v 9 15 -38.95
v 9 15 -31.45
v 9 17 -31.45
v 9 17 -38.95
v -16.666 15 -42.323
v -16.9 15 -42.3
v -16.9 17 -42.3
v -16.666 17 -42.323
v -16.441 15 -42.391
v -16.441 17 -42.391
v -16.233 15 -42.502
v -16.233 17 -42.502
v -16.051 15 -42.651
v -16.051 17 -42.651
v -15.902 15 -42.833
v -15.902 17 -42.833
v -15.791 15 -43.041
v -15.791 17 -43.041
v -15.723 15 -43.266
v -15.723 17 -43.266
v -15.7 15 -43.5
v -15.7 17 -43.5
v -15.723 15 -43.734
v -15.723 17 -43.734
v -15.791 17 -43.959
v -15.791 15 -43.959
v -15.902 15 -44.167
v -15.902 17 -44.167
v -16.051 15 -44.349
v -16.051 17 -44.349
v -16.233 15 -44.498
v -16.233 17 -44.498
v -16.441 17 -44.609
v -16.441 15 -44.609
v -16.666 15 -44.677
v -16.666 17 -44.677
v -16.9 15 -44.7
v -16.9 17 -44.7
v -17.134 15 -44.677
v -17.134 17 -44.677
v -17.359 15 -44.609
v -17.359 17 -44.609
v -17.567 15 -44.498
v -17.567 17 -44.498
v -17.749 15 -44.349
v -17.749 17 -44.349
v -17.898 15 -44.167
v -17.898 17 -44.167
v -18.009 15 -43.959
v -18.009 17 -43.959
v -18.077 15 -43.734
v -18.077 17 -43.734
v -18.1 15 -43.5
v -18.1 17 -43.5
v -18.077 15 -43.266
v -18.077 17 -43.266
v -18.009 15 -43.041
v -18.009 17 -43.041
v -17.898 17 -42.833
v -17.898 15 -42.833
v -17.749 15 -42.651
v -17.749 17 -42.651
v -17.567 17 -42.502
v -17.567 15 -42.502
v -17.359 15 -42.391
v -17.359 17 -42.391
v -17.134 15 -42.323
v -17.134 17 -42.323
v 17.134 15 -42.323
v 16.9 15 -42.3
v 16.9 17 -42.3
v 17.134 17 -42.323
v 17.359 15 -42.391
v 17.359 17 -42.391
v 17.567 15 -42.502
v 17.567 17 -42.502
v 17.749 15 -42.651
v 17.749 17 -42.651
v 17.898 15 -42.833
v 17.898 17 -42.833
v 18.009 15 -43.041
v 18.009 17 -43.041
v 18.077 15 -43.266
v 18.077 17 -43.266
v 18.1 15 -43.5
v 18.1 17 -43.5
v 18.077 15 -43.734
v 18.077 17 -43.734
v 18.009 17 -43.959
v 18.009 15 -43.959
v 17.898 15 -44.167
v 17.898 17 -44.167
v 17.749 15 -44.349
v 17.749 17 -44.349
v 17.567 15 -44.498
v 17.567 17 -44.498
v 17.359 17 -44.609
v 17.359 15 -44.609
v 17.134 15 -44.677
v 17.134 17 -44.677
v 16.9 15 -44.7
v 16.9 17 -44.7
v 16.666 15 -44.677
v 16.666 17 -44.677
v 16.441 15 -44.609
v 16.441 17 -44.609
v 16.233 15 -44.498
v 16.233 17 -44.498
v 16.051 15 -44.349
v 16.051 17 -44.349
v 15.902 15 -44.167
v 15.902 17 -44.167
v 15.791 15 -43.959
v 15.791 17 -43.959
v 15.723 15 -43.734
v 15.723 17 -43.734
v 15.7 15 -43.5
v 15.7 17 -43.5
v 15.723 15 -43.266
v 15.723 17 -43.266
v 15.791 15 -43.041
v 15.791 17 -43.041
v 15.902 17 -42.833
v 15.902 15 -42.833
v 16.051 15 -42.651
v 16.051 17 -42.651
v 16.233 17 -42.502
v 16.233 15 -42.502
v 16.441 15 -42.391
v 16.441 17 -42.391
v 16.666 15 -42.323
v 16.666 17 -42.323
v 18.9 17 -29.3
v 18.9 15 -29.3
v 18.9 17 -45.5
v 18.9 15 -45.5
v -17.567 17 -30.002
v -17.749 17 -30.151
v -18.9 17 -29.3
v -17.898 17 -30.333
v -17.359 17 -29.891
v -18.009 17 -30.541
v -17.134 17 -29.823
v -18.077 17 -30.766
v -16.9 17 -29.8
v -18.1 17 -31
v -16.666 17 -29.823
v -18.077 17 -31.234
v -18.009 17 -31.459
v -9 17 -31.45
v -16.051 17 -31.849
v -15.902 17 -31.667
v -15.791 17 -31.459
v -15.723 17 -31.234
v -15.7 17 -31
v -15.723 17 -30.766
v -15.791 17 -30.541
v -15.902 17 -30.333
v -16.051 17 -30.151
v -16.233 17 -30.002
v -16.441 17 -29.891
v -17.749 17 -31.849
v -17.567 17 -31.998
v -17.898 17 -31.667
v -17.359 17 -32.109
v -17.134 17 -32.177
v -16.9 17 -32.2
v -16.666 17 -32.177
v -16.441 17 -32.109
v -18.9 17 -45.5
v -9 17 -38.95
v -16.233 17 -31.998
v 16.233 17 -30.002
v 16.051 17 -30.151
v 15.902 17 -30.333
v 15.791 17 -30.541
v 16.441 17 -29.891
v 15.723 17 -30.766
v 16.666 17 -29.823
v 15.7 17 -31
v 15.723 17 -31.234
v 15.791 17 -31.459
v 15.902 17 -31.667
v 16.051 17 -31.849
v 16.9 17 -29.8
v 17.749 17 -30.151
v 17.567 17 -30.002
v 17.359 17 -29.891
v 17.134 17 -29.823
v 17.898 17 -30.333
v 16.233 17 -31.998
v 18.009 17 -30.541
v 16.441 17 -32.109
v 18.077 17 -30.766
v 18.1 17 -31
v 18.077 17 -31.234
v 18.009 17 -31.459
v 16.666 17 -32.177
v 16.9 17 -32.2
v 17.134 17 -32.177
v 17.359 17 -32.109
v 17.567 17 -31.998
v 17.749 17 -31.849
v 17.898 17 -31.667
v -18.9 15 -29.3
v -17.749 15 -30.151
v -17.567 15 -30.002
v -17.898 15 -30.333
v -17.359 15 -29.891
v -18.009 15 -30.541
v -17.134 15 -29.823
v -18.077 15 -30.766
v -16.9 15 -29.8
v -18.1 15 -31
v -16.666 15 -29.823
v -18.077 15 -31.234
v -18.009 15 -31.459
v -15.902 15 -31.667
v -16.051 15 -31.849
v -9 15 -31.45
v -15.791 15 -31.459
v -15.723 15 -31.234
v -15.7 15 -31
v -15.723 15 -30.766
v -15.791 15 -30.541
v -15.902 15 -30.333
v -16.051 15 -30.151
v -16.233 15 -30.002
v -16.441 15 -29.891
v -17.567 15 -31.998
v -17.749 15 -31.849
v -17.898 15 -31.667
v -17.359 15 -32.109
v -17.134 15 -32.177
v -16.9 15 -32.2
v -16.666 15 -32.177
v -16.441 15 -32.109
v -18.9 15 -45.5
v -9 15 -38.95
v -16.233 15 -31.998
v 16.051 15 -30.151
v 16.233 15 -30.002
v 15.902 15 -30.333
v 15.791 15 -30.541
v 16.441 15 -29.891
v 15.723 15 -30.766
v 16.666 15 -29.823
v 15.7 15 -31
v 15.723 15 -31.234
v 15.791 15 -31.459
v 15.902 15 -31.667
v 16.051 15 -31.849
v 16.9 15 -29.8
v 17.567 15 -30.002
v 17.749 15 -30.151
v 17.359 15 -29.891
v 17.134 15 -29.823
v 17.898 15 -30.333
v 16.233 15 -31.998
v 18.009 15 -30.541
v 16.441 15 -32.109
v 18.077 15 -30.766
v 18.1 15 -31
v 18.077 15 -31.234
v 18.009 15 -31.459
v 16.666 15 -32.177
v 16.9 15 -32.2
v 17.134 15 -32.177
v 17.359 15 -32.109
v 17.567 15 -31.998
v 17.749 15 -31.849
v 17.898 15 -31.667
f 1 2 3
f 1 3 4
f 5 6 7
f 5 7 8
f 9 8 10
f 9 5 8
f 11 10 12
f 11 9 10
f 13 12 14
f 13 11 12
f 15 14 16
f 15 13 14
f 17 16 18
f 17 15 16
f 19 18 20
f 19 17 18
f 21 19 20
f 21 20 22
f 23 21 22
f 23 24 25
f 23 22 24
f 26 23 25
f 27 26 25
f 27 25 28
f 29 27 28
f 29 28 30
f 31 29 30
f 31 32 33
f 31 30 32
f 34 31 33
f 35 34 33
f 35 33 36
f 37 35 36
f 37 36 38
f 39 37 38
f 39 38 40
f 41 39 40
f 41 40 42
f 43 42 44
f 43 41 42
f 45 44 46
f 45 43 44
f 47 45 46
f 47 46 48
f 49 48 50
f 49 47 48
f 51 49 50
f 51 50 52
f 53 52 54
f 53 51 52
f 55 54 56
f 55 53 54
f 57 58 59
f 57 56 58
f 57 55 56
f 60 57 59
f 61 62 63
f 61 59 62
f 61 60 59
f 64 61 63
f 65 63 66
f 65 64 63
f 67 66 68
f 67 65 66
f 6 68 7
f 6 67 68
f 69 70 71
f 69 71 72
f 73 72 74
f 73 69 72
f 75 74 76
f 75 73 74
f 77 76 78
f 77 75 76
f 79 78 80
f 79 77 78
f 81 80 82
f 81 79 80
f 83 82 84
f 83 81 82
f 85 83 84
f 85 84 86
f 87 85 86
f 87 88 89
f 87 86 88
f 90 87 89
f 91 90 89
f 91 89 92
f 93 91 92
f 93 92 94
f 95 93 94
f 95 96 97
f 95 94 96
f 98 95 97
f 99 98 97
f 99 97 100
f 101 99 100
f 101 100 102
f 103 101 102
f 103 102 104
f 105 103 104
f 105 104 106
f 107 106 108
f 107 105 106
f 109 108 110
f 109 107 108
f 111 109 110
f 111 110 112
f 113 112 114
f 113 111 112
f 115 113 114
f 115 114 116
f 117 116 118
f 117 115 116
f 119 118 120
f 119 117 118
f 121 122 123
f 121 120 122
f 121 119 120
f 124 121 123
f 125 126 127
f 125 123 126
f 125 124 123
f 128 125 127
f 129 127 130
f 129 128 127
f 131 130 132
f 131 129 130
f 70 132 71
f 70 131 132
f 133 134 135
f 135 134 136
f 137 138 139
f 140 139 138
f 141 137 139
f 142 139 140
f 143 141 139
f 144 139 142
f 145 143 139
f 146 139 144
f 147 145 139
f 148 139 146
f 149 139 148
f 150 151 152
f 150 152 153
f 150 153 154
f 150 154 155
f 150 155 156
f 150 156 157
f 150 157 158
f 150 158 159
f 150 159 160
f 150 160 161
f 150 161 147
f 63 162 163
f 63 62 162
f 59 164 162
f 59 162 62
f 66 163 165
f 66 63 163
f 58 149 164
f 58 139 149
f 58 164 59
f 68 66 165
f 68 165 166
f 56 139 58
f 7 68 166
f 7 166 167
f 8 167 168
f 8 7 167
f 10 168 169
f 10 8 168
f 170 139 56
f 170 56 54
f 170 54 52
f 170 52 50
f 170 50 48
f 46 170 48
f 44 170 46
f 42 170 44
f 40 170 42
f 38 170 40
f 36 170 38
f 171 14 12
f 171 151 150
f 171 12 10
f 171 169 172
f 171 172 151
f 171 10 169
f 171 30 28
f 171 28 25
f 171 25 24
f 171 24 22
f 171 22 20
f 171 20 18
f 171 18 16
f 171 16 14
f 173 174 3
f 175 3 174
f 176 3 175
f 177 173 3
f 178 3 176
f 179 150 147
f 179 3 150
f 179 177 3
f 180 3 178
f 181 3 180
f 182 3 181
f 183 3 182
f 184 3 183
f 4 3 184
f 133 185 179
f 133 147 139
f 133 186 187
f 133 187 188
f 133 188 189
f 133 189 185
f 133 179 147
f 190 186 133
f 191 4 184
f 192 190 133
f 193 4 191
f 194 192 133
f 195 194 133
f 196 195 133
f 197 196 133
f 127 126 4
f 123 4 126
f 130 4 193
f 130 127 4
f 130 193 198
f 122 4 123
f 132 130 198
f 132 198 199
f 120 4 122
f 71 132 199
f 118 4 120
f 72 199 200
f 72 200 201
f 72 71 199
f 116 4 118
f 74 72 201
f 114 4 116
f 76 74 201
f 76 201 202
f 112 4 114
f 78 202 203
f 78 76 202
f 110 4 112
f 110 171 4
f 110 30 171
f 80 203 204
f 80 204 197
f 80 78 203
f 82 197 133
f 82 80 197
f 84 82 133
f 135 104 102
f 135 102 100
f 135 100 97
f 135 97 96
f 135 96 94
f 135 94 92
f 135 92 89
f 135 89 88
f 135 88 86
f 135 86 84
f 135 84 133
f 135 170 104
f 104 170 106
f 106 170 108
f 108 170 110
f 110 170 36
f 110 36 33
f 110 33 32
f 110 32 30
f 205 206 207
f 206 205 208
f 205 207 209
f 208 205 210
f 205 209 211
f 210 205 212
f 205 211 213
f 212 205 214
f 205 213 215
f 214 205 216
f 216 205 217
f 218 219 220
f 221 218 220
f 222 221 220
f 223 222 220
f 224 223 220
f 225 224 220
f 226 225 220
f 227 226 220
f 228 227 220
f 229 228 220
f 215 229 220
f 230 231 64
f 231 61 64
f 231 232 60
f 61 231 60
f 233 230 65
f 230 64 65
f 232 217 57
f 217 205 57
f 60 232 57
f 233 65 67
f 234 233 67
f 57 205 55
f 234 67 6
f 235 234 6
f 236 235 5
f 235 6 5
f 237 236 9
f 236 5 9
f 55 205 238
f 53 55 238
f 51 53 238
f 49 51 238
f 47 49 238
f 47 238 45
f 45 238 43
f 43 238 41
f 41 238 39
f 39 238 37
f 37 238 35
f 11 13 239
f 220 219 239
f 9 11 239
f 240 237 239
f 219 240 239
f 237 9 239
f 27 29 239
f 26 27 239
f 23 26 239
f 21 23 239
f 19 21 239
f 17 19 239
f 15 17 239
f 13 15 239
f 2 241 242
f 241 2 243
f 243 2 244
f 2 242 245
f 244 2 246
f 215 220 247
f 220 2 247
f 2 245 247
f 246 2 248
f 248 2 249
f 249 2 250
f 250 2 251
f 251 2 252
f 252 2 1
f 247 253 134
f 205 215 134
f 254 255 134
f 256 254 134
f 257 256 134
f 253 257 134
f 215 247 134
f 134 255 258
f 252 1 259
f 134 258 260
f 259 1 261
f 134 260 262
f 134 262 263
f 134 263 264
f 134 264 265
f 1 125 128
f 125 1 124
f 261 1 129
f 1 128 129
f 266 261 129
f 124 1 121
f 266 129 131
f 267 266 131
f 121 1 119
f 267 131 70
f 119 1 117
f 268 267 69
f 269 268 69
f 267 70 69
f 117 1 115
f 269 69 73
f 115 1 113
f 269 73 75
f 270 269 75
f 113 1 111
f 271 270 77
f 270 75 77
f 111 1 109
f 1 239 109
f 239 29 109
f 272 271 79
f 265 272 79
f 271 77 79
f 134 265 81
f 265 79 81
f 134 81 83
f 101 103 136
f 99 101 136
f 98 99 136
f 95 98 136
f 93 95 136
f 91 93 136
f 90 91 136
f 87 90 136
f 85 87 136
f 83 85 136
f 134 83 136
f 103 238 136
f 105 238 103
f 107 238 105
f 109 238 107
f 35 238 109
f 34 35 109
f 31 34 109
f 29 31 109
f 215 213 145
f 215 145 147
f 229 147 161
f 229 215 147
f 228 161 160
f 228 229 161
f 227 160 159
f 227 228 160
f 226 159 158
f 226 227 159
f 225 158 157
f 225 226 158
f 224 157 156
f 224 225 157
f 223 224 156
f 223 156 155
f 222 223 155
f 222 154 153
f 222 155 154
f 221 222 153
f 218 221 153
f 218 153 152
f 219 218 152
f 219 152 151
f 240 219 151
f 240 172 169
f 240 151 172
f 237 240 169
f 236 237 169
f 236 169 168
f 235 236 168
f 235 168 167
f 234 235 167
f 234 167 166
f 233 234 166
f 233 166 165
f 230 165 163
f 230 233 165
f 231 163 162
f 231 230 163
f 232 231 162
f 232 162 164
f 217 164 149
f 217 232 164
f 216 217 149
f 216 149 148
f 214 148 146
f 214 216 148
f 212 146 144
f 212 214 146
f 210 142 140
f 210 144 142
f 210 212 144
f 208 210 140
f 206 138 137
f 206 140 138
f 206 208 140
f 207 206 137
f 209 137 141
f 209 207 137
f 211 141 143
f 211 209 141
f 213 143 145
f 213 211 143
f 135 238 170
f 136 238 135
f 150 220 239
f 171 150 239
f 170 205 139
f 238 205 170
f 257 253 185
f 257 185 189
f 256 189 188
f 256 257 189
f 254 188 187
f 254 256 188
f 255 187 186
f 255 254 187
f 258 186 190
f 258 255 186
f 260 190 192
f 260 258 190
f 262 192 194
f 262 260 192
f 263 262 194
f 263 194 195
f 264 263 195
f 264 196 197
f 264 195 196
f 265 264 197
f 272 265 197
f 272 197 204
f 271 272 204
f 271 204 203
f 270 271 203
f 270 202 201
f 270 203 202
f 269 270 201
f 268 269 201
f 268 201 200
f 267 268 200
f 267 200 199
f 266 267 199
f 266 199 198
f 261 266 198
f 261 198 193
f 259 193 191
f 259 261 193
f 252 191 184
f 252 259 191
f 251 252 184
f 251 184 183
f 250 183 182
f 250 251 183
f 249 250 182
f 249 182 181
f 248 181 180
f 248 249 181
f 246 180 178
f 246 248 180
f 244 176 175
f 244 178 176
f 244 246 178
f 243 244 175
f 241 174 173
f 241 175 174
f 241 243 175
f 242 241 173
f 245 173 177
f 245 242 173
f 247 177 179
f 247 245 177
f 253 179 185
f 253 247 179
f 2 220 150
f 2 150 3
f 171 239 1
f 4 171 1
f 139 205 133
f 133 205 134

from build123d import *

# Parameters (mm, degrees)
SKETCH1_W                = 37.8
SKETCH1_H                = 16.2
RETAINER_PLATE_DEPTH     = 2
SKETCH2_W                = 18
SKETCH2_H                = 7.5
RIBBON_SLOT_DEPTH        = 4
SKETCH3_R                = 1.2
M2_CLEARANCE_HOLES_DEPTH = 4


with BuildPart() as part:
    # Sketch1 → Retainer Plate (new body)
    with BuildSketch(Plane(origin=(0, 15, 0), x_dir=(1, 0, 0), z_dir=(0, 1, 0))):
        with Locations((0, 37.4)):
            Rectangle(SKETCH1_W, SKETCH1_H)
    extrude(amount=RETAINER_PLATE_DEPTH)

    # Sketch2 → Ribbon Slot (cut)
    with BuildSketch(Plane(origin=(0, 14, 0), x_dir=(1, 0, 0), z_dir=(0, 1, 0))):
        with Locations((0, 35.2)):
            Rectangle(SKETCH2_W, SKETCH2_H)
    extrude(amount=RIBBON_SLOT_DEPTH, mode=Mode.SUBTRACT)

    # Sketch3 → M2 Clearance Holes (cut)
    with BuildSketch(Plane(origin=(0, 14, 0), x_dir=(1, 0, 0), z_dir=(0, 1, 0))):
        with Locations(Location((-16.9, 31, 0), (0, 0, 270))):
            Circle(SKETCH3_R)
        with Locations(Location((-16.9, 43.5, 0), (0, 0, 270))):
            Circle(SKETCH3_R)
        with Locations(Location((16.9, 31, 0), (0, 0, 270))):
            Circle(SKETCH3_R)
        with Locations(Location((16.9, 43.5, 0), (0, 0, 270))):
            Circle(SKETCH3_R)
    extrude(amount=M2_CLEARANCE_HOLES_DEPTH, mode=Mode.SUBTRACT)


solid = part.part
